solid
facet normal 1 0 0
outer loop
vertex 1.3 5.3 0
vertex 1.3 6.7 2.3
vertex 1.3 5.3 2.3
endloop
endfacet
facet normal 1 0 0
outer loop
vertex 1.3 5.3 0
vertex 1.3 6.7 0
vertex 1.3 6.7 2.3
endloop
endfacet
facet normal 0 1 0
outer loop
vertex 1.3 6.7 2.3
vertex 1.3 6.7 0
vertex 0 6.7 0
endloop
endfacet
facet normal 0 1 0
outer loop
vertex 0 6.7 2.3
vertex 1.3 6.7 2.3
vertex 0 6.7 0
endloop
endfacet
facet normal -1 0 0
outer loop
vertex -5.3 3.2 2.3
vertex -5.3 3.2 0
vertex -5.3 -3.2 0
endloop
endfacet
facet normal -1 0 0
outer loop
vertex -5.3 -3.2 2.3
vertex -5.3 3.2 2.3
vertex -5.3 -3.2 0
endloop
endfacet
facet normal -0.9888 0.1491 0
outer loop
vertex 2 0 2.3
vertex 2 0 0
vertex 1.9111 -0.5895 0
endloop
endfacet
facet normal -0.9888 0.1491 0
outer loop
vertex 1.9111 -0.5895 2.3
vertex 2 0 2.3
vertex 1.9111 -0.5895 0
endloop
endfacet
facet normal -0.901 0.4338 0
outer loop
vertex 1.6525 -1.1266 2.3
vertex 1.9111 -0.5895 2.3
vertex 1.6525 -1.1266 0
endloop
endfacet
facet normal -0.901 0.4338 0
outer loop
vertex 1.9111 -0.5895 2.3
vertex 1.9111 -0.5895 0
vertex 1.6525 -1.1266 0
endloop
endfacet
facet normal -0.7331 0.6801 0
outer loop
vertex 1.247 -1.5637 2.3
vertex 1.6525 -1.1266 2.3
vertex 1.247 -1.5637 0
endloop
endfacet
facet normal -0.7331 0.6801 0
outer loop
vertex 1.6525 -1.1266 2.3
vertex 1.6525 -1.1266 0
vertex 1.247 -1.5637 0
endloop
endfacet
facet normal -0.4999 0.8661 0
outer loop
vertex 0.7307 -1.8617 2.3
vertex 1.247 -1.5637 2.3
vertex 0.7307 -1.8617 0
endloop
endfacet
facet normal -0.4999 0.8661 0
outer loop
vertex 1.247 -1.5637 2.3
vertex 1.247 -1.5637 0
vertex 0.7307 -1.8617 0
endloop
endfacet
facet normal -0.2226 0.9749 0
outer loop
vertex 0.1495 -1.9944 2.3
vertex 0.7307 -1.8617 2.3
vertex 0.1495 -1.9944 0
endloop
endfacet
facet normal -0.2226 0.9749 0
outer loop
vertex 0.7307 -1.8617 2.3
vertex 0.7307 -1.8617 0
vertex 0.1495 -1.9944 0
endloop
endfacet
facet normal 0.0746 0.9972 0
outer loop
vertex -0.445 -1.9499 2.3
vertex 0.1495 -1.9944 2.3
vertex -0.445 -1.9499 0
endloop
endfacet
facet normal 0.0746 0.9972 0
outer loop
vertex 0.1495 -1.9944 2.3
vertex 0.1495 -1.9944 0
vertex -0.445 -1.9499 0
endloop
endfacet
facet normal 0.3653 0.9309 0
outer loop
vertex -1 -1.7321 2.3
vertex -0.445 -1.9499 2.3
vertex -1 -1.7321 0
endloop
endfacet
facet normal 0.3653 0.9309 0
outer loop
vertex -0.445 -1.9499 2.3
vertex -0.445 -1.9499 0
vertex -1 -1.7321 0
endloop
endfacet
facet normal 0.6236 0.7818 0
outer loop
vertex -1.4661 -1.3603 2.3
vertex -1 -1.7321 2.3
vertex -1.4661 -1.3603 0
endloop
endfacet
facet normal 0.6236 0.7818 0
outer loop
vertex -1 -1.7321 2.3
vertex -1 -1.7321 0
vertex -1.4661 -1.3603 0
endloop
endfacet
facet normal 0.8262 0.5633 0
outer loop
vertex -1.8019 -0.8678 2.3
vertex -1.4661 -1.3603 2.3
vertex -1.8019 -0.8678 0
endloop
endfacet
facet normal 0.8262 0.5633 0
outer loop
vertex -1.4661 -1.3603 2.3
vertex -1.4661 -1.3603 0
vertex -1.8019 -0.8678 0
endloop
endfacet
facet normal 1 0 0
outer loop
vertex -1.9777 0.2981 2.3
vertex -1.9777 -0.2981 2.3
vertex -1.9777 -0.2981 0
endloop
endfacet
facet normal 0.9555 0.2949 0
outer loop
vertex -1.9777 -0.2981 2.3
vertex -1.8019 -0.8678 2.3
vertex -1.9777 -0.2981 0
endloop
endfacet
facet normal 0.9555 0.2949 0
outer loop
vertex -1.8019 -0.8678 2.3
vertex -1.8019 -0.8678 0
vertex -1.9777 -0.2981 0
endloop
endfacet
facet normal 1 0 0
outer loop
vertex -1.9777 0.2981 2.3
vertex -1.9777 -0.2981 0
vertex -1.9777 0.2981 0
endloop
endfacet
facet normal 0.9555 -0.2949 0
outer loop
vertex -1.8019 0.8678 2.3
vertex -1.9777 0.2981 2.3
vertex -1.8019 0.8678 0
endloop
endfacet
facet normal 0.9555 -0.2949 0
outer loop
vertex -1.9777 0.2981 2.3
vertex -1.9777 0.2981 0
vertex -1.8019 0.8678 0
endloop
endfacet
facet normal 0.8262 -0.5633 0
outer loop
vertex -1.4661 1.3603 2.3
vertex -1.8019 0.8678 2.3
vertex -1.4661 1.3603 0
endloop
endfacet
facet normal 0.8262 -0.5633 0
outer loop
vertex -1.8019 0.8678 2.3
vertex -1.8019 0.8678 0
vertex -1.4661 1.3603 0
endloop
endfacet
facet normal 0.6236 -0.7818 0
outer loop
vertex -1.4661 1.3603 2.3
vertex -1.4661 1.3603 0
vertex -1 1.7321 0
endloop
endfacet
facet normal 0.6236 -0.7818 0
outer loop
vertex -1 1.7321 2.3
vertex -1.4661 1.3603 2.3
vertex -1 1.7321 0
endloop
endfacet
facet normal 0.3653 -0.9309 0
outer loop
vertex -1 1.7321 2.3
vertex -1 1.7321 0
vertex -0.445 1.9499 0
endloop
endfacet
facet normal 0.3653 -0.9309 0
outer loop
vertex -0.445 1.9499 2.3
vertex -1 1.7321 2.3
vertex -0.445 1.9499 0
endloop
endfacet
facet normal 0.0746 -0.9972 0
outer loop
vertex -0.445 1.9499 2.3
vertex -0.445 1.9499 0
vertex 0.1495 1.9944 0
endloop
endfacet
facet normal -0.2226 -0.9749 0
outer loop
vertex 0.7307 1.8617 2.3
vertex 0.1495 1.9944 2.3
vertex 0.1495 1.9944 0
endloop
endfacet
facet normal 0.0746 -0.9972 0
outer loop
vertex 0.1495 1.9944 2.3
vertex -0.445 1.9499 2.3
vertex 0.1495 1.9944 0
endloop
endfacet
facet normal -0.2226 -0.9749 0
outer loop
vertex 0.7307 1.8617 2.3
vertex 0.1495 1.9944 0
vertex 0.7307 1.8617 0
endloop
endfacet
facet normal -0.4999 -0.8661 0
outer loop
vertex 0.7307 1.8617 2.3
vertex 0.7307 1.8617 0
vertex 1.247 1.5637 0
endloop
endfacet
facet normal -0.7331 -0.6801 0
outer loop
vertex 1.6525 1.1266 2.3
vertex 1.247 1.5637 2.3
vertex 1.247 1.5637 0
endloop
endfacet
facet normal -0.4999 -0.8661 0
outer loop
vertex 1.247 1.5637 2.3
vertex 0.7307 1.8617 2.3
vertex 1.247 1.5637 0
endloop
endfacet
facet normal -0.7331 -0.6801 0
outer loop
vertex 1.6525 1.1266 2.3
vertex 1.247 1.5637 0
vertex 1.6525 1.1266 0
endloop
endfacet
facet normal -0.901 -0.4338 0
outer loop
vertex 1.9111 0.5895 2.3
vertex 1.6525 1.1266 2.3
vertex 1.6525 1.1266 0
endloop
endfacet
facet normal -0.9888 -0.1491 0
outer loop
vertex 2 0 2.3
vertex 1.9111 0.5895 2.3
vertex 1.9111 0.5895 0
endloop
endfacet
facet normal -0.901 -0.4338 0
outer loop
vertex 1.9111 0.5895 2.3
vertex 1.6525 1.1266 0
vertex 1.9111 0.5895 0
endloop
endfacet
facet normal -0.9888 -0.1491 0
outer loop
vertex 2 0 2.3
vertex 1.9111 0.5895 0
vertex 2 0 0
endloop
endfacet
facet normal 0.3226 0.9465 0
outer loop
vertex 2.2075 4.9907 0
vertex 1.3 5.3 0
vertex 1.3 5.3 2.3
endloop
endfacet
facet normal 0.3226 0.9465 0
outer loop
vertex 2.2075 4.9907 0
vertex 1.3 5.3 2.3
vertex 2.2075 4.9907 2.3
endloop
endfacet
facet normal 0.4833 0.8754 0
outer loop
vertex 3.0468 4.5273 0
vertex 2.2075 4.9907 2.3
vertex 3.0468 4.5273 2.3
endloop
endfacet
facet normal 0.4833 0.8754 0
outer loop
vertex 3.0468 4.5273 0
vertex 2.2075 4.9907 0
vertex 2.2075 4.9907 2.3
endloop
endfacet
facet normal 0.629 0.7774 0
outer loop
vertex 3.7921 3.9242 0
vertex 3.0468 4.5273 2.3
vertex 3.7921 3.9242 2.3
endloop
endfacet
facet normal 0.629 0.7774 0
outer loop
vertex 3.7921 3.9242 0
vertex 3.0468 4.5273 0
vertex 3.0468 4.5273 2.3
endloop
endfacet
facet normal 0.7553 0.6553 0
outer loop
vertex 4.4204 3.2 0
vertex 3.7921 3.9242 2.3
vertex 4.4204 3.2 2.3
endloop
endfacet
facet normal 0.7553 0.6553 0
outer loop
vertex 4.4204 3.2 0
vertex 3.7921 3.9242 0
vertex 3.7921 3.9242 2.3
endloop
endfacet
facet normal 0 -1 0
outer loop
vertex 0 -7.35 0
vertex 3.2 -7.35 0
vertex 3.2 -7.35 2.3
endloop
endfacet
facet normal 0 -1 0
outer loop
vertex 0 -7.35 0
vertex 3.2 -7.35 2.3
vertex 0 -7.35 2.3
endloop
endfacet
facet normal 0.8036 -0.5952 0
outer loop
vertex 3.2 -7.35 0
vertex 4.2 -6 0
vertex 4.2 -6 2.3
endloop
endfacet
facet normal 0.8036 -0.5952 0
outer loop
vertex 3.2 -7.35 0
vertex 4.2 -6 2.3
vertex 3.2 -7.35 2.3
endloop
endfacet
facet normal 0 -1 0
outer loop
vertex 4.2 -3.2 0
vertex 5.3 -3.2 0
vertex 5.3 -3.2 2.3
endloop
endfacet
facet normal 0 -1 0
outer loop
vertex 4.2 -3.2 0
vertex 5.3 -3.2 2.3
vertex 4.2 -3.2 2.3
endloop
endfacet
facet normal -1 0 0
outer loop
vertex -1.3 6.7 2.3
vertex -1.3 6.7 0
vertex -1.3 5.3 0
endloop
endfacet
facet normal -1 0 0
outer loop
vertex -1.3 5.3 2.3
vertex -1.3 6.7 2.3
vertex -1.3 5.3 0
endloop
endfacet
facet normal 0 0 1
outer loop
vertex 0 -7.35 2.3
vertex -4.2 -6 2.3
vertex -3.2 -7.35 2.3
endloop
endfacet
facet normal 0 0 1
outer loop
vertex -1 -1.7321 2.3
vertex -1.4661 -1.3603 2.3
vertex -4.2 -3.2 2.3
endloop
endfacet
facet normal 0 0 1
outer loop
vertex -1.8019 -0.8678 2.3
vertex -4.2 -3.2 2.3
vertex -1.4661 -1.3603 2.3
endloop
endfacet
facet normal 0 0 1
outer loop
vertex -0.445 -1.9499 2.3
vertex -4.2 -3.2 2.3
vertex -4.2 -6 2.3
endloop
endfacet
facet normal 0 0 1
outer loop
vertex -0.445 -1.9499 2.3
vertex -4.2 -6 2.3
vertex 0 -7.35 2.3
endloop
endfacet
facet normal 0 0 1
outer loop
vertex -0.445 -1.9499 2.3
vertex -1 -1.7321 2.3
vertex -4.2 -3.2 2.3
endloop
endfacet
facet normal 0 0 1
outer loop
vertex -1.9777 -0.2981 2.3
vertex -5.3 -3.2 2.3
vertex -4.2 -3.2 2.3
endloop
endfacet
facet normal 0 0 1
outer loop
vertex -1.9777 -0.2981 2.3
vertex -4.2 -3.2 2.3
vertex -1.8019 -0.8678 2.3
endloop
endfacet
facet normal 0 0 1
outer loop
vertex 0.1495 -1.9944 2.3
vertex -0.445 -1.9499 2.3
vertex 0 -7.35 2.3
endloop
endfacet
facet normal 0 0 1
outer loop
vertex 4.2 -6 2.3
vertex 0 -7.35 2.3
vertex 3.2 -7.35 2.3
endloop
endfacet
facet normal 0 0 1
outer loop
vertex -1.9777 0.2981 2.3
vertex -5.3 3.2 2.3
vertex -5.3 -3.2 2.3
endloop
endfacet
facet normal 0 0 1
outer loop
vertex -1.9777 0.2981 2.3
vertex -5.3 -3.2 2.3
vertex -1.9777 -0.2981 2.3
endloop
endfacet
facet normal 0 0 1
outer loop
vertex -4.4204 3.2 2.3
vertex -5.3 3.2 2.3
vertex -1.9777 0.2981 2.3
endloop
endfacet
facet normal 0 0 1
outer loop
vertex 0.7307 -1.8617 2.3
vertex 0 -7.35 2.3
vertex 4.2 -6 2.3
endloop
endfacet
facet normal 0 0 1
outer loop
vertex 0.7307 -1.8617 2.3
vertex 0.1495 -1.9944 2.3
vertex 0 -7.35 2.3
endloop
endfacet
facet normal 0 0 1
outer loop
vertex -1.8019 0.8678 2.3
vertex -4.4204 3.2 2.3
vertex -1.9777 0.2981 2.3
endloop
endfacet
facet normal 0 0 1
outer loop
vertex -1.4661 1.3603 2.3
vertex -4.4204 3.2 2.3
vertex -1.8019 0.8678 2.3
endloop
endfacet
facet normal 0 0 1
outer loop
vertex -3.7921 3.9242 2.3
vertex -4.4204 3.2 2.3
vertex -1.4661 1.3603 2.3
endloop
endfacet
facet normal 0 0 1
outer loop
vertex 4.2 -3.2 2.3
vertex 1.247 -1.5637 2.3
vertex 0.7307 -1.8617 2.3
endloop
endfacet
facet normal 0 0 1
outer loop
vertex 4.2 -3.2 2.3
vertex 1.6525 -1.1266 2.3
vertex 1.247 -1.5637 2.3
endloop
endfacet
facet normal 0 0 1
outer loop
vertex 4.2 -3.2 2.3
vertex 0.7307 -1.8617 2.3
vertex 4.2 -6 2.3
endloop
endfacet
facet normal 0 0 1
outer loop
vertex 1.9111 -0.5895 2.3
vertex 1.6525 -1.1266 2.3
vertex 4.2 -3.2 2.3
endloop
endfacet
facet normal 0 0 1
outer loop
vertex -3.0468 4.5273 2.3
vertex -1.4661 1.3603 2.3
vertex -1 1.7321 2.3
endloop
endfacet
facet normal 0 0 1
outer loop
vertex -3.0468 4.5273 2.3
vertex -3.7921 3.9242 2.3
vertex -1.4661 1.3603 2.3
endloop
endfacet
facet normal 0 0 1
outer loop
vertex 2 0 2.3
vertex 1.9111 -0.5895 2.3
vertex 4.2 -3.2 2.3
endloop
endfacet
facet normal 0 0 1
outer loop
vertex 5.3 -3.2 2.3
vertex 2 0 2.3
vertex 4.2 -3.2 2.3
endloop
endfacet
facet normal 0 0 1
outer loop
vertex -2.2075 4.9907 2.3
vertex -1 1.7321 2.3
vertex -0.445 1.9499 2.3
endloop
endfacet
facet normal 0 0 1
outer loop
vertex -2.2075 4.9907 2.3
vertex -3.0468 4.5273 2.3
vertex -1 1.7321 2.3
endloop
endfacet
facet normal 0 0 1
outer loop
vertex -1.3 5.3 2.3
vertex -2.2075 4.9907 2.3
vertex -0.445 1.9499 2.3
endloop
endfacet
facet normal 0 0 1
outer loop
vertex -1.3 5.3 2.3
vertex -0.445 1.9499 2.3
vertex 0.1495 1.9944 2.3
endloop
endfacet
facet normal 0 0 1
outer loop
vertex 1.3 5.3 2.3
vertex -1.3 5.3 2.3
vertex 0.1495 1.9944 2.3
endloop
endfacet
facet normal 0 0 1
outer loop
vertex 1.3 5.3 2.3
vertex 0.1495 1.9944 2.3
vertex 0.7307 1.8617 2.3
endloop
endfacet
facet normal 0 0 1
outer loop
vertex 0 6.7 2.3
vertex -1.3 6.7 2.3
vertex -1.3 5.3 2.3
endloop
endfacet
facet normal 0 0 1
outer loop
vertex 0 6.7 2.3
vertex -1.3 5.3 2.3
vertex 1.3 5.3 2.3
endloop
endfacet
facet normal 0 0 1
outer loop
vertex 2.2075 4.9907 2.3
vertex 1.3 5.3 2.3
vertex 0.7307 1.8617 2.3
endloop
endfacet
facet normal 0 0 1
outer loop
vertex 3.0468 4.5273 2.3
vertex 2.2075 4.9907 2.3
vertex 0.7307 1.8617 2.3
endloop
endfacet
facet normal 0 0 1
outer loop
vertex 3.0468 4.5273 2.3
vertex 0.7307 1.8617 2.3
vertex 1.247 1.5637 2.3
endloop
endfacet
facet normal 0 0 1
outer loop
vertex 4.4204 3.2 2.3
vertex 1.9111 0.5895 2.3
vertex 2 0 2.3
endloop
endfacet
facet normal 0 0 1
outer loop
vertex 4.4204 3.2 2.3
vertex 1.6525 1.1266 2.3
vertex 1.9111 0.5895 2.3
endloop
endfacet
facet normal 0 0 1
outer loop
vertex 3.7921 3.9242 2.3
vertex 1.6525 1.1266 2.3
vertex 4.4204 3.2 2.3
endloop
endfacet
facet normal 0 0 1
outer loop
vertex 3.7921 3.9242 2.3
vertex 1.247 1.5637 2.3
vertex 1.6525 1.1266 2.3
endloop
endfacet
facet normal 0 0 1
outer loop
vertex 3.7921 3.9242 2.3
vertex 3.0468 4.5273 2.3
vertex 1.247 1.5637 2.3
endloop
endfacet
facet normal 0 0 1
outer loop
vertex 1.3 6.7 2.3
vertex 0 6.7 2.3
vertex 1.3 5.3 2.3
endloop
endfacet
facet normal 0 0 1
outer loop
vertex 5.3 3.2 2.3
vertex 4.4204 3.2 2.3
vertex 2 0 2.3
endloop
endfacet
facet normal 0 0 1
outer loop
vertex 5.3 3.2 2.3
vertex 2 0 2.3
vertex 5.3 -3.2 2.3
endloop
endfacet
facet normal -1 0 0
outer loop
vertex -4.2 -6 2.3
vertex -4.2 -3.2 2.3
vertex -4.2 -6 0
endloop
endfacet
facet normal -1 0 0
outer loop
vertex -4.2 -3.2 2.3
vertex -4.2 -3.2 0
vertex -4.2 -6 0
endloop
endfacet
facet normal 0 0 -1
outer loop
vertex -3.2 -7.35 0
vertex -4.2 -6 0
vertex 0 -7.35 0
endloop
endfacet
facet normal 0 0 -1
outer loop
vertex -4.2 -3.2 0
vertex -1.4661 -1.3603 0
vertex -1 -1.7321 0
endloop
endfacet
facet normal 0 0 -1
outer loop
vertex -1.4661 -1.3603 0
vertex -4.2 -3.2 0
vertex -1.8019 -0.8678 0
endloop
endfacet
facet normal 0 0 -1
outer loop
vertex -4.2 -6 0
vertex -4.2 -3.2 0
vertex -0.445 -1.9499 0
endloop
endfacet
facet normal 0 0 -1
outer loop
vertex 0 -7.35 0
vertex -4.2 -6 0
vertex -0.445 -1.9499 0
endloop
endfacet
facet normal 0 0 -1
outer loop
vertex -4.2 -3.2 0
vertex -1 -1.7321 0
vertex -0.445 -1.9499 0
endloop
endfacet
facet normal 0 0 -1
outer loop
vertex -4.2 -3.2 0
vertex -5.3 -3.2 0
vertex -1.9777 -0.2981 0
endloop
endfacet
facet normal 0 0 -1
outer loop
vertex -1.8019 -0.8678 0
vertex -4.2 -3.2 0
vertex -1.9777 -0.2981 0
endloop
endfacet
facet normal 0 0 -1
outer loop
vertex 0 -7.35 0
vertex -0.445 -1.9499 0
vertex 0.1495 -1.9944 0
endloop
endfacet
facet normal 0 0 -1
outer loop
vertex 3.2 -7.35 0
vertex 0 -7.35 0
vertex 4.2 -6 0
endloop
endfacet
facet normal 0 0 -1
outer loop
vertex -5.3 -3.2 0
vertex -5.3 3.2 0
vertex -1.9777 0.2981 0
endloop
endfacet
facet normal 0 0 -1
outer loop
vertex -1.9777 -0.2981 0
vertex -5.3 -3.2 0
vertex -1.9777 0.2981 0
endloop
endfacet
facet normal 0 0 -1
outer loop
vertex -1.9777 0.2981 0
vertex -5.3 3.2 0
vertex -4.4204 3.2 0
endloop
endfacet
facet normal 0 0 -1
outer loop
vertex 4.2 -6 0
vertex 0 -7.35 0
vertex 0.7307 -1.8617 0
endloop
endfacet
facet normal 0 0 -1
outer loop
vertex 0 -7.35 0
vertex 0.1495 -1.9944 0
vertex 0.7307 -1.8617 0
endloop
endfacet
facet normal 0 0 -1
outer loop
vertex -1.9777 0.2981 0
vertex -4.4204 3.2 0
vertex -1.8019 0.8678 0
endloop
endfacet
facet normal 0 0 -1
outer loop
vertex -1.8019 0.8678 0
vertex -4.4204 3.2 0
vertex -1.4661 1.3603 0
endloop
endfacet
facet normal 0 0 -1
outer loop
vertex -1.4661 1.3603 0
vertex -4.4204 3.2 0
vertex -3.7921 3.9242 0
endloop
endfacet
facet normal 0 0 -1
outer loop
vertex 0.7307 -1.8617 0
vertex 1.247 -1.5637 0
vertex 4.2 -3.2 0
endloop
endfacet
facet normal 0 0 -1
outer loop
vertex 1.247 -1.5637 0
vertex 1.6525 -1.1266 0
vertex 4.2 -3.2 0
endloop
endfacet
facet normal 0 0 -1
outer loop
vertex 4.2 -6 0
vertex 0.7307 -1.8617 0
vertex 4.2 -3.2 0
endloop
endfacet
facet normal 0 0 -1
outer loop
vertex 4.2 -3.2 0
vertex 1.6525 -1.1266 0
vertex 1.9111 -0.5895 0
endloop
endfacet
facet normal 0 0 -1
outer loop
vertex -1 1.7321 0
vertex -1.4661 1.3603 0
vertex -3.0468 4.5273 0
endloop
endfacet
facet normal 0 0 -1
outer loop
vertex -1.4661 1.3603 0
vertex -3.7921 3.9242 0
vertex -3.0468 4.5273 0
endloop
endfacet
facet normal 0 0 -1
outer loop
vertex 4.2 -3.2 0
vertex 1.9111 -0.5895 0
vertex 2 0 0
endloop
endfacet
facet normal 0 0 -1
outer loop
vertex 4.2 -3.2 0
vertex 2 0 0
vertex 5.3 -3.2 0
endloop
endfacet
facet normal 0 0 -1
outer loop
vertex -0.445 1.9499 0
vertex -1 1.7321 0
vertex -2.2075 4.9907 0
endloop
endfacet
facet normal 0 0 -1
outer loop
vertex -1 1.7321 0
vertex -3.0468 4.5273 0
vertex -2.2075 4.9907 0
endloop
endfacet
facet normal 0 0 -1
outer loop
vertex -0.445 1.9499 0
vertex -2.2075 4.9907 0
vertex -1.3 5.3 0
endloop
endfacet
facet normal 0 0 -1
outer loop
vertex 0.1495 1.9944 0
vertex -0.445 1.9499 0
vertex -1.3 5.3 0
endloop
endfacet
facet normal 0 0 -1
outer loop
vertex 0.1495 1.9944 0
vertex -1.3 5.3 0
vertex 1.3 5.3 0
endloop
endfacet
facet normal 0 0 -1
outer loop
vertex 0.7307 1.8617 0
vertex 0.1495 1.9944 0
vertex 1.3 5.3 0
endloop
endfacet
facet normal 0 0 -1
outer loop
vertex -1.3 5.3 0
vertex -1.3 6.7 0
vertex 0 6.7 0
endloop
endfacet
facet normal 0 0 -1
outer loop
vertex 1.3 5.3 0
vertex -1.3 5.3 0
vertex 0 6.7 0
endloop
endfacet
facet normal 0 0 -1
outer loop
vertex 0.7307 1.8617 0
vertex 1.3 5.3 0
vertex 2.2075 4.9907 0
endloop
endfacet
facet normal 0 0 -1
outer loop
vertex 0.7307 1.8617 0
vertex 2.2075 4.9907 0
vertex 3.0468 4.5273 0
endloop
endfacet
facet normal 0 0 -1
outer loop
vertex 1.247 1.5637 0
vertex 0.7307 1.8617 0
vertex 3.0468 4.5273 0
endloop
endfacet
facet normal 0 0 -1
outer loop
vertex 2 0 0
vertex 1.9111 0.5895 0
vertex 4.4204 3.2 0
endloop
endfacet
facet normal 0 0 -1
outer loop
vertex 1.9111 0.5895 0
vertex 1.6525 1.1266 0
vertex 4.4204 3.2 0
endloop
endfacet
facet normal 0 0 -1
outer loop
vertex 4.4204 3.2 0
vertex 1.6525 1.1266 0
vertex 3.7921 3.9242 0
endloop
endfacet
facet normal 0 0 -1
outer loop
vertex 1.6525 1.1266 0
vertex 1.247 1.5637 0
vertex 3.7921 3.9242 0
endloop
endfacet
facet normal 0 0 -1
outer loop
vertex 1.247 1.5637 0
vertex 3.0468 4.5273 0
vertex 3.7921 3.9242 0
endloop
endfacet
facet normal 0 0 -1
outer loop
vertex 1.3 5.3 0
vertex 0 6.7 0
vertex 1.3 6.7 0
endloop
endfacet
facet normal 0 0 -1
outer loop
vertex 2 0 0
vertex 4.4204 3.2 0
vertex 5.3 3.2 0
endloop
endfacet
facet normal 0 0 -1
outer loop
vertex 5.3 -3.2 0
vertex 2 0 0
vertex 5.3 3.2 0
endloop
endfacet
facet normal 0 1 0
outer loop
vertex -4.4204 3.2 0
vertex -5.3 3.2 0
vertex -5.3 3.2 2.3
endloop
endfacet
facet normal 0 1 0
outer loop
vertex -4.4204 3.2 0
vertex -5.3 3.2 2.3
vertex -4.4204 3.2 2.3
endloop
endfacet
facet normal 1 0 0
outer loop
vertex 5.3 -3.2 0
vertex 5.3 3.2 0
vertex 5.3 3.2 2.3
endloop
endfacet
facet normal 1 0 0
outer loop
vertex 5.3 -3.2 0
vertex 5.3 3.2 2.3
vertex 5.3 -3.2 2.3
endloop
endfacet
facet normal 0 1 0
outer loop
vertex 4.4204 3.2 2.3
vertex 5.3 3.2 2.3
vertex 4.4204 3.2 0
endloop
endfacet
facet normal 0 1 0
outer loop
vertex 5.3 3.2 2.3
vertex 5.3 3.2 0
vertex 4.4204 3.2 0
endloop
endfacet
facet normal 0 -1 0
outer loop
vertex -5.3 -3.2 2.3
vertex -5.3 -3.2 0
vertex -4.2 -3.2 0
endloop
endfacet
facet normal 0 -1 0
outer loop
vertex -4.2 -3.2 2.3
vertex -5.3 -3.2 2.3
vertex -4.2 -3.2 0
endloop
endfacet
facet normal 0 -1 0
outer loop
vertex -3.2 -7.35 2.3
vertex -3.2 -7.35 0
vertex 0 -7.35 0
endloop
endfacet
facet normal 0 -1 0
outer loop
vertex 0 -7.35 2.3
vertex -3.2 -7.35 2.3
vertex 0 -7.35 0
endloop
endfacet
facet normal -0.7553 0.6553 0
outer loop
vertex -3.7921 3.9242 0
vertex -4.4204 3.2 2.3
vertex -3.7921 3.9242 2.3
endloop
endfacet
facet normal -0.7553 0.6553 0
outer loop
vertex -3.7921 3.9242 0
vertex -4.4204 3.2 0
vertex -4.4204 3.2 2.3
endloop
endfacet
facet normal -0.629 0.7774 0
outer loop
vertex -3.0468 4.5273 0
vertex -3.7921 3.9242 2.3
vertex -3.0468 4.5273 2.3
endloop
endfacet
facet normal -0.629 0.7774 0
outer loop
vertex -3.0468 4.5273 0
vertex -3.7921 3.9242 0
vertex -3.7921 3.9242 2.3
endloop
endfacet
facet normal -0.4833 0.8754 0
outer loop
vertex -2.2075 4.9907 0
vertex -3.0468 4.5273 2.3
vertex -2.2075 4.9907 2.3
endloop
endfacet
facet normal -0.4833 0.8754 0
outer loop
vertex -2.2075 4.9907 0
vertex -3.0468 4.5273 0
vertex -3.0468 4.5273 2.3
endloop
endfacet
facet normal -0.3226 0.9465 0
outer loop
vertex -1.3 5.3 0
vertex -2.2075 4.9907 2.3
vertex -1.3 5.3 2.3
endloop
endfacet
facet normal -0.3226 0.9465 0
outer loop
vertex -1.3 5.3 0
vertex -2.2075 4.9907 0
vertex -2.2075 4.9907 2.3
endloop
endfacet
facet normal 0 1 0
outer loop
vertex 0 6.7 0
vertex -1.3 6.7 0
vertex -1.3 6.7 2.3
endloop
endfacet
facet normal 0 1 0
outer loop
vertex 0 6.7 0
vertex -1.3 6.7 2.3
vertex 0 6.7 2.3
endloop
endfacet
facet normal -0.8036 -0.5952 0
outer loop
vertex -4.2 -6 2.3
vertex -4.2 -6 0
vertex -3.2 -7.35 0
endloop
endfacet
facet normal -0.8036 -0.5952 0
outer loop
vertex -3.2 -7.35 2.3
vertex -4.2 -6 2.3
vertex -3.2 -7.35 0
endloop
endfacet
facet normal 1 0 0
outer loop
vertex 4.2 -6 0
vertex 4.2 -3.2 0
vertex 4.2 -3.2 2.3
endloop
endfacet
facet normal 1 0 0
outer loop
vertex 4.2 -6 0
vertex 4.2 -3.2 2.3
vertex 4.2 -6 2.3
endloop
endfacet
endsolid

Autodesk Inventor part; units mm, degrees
ref_plane "YZ Plane" through (0, 0, 0) normal (1, 0, 0) x (0, 1, 0)
ref_plane "XZ Plane" through (0, 0, 0) normal (0, 1, 0) x (-1, 0, 0)
ref_plane "XY Plane" through (0, 0, 0) normal (0, 0, 1) x (1, 0, 0)
sketch "Sketch1" plane through (0, 0, 0) normal (0, 0, 1) x (1, 0, 0)
  circle A0 centre (0, 0) radius 2
  line L0 (-5.3, 3.2) -> (-5.3, -3.2)
  line L1 (-5.3, -3.2) -> (-4.2, -3.2)
  line L2 (-4.2, -3.2) -> (-4.2, -6)
  line L3 (-4.2, -6) -> (-3.2, -7.35)
  line L4 (-3.2, -7.35) -> (0, -7.35)
  line L5 (-1.3, 6.7) -> (-1.3, 5.3)
  line L6 (-1.3, 6.7) -> (0, 6.7)
  line L7 (0, 5.3) -> (0, -7.35) construction
  arc A1 (-1.3, 5.3) -> (-4.4204, 3.2) centre (0, 0) ccw
  line L8 (-5.3, 3.2) -> (-4.4204, 3.2)
  line L9 (0, 0) -> (-5.3, 0) construction
  line L10 (5.3, 3.2) -> (5.3, -3.2)
  line L11 (5.3, -3.2) -> (4.2, -3.2)
  line L12 (4.2, -3.2) -> (4.2, -6)
  line L13 (4.2, -6) -> (3.2, -7.35)
  line L14 (3.2, -7.35) -> (0, -7.35)
  line L15 (1.3, 6.7) -> (1.3, 5.3)
  line L16 (1.3, 6.7) -> (0, 6.7)
  arc A2 (4.4204, 3.2) -> (1.3, 5.3) centre (0, 0) ccw
  line L17 (5.3, 3.2) -> (4.4204, 3.2)
  line L18 (0, 0) -> (5.3, 0) construction
  dimension "d0" = 4
  dimension "d1" = 1.3
  dimension "d2" = 5.3
  dimension "d3" = 6.7
  dimension "d4" = 4.2
  dimension "d5" = 5.3
  dimension "d7" = 3.2
  dimension "d9" = 7.35
  dimension "d10" = 3.2
  dimension "d11" = 2.8
extrude "Extrusion1" add sketch "Sketch1" along normal blind 2.3
properties part number "encoder_coarse"
